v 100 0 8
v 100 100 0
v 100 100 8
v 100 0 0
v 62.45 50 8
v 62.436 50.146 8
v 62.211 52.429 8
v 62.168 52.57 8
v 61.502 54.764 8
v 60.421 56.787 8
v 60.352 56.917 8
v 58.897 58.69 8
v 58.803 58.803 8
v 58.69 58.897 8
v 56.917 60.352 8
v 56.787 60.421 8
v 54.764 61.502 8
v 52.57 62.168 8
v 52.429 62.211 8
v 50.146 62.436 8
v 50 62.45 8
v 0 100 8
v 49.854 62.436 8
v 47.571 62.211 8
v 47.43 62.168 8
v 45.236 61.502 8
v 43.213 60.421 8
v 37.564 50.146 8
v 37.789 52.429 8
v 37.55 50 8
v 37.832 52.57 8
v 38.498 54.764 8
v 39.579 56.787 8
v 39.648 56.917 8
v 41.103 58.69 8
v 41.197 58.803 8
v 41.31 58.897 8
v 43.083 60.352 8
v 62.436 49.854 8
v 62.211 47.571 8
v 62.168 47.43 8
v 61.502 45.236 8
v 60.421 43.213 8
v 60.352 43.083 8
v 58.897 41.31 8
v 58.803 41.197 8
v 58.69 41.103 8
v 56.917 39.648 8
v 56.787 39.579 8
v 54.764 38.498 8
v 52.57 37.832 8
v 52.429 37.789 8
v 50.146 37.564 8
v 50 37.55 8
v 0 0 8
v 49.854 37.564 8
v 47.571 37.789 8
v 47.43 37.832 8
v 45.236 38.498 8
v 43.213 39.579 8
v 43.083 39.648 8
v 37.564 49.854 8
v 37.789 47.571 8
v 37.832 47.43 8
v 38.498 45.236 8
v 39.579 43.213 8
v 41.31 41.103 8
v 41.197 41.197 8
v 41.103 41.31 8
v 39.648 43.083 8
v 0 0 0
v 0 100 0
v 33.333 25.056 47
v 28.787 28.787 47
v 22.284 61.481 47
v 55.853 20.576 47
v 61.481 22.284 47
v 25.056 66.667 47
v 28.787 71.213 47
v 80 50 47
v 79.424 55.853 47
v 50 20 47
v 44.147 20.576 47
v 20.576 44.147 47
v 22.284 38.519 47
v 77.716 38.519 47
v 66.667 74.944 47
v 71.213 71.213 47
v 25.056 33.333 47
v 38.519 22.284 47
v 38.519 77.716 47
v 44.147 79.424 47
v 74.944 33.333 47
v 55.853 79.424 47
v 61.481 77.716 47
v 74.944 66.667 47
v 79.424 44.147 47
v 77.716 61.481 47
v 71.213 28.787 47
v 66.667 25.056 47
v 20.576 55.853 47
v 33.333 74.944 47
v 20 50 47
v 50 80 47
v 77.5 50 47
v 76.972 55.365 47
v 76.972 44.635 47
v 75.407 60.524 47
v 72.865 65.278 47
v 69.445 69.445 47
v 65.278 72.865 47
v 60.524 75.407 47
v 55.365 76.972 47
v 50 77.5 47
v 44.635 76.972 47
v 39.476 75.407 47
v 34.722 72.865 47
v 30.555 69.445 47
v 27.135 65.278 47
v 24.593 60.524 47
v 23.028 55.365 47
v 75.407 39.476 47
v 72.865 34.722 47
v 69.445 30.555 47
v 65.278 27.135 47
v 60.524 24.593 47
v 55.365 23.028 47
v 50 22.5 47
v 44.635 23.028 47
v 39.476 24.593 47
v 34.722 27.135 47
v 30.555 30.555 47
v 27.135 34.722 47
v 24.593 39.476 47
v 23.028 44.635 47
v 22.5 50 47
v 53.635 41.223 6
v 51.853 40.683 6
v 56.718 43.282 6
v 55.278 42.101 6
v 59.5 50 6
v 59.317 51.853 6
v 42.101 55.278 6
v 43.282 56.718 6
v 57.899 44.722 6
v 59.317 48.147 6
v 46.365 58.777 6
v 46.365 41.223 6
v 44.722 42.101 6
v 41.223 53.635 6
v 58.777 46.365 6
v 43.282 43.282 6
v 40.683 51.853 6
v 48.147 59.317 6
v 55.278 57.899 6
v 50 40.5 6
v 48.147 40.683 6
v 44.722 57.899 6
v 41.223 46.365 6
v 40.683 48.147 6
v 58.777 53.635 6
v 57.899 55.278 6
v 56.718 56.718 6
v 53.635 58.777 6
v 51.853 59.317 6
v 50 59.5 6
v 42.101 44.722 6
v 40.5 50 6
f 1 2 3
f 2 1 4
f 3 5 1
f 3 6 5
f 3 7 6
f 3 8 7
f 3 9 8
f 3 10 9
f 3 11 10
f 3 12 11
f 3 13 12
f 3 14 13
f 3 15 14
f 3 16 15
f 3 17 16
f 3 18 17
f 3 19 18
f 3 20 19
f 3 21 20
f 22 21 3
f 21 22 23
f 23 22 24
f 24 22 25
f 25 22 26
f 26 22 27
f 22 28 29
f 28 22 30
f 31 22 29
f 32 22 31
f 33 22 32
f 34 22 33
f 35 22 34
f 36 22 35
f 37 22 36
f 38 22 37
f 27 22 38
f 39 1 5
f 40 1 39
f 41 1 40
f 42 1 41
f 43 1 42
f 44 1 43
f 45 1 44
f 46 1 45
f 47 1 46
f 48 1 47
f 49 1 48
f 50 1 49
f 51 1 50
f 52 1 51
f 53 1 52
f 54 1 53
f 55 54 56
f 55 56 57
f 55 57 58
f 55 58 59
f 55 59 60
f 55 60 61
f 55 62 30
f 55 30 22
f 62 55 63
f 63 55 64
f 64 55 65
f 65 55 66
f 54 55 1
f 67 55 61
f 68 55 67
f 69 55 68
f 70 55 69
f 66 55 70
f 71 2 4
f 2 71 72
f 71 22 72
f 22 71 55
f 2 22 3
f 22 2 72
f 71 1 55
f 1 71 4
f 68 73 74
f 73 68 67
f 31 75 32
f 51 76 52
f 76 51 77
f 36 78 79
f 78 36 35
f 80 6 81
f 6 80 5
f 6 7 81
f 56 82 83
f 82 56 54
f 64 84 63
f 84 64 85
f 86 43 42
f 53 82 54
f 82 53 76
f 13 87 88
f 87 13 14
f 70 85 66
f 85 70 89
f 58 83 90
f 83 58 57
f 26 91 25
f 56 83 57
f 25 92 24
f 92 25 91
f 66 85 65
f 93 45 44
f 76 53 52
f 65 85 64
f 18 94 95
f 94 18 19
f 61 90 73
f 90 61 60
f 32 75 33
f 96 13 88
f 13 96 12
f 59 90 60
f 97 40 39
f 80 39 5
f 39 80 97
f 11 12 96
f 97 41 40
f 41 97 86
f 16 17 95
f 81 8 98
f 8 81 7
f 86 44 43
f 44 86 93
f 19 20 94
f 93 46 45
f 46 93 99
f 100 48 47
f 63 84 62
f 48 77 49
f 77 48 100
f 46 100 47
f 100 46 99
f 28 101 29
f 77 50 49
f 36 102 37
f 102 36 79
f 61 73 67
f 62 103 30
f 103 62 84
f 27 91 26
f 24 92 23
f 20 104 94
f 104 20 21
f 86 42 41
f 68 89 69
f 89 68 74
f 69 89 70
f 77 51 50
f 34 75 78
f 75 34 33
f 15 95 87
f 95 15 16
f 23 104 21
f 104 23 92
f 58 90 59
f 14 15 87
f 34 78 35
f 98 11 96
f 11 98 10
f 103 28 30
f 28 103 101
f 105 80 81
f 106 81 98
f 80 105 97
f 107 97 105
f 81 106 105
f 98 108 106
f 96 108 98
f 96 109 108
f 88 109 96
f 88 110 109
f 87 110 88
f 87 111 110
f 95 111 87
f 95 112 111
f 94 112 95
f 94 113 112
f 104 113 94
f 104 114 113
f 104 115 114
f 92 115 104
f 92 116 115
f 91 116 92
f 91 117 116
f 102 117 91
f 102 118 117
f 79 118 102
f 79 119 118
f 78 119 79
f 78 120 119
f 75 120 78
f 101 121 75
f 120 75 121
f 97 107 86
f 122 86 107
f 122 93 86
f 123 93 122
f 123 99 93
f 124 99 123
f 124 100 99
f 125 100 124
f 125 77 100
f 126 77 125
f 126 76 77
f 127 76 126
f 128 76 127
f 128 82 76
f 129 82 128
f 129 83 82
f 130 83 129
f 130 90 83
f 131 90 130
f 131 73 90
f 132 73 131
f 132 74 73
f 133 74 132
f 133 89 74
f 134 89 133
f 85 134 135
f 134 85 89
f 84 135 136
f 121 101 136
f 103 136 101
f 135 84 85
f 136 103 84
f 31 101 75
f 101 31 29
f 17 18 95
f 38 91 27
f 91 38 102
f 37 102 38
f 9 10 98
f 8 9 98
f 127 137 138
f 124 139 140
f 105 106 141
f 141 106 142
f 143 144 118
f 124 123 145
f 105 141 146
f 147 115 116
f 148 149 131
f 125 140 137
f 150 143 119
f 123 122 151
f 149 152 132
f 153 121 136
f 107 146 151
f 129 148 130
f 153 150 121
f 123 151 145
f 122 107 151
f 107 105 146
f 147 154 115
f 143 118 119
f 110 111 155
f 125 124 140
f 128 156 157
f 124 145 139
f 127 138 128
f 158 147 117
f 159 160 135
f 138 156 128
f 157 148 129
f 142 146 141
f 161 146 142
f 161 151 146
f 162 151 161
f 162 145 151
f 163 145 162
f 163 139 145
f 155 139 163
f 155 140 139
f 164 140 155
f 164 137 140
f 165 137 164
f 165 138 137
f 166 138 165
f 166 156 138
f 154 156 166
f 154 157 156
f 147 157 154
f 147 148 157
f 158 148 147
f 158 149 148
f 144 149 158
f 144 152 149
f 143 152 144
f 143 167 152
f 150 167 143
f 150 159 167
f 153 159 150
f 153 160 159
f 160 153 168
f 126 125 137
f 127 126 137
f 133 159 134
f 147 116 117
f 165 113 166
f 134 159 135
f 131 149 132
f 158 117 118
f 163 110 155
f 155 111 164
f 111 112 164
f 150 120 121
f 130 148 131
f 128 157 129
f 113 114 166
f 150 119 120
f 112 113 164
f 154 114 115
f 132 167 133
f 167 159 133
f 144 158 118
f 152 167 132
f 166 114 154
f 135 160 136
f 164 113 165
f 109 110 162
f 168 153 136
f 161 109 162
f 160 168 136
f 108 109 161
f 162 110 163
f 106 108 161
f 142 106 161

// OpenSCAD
$fn = 32;

// ----------------------------------------------------------------------
// Hopper: funnel with square flange
// ----------------------------------------------------------------------

// --- parameters (mm) ---
fl = 100;                 // flange side, X and Y
fl_t = 8;                 // flange thickness
cone_h = 40;              // cone height above the flange
top_d = 60;               // cone mouth diameter
bot_d = 24;               // cone spout diameter
wall = 2.5;               // cone wall thickness
fit_tol = 0.05;           // tolerance for press fits, mm
free_tol = 0.2;           // tolerance for clearance fits, mm

bore_d = bot_d - 2 * wall;  // spout bore diameter
total_h = fl_t + cone_h - 1;  // overall height

difference() {
  union() {
    cube([fl, fl, fl_t]);
    translate([fl / 2, fl / 2, fl_t - 1])
      cylinder(h = cone_h, d1 = bot_d, d2 = top_d);
  }
  translate([fl / 2, fl / 2, fl_t - 2])
    cylinder(h = cone_h + 1, d1 = bore_d, d2 = top_d - 2 * wall);
}
